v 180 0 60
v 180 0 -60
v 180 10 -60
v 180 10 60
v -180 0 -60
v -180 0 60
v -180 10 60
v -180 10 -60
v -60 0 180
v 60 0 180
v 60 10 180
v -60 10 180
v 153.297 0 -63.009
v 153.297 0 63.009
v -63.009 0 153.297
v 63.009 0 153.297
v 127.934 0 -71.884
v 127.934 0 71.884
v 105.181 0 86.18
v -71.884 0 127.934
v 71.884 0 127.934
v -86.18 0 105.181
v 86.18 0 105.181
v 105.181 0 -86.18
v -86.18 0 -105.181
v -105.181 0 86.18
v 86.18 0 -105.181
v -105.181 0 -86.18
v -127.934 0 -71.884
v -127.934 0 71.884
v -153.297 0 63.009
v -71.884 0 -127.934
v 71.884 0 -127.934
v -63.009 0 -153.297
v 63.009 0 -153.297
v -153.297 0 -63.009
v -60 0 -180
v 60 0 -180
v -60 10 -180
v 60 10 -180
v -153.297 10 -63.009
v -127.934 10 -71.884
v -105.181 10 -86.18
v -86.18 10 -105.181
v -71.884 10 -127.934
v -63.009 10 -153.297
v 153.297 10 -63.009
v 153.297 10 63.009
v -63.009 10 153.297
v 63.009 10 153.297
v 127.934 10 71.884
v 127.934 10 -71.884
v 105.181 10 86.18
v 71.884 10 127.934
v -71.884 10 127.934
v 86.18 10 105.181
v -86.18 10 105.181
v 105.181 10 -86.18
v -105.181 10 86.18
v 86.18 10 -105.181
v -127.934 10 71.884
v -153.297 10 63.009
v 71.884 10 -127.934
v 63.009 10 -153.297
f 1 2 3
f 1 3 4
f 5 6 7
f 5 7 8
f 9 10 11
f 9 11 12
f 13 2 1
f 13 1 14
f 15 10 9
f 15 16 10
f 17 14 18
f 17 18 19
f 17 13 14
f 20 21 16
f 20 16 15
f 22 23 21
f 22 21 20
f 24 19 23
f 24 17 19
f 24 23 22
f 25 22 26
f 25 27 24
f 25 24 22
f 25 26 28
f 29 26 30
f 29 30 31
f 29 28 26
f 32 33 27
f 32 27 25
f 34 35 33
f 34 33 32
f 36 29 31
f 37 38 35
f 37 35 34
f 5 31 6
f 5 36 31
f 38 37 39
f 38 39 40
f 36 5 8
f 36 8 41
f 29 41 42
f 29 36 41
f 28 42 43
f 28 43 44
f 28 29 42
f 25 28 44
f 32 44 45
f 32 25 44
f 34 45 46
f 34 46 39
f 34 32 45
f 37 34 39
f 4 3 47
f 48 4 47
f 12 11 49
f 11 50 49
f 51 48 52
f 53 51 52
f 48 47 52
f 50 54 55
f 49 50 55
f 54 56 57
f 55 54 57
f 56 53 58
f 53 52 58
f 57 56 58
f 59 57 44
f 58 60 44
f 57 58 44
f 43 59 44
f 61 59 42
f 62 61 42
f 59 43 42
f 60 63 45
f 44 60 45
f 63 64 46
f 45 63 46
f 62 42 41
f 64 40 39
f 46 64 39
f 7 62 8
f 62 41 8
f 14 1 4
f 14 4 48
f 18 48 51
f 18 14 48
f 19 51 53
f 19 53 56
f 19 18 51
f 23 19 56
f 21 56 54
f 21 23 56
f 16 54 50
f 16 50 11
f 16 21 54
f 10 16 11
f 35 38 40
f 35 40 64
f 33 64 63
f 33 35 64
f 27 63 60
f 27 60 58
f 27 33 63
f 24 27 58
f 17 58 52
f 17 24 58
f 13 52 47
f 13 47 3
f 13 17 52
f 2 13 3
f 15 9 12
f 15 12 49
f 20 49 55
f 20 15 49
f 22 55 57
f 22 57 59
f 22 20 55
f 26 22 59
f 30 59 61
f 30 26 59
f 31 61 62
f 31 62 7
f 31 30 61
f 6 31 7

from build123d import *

# Parameters (mm, degrees)
BOSS_EXTRUDE1_DEPTH = 10


with BuildPart() as part:
    # Sketch1 → Boss-Extrude1 (new body)
    with BuildSketch(Plane(origin=(0, 0, 0), x_dir=(1, 0, 0), z_dir=(0, 1, 0))):
        Polygon((60, -60), (60, -180), (-60, -180), (-60, -60), (-180, -60), (-180, 60), (-60, 60), (-60, 180), (60, 180), (60, 60), (180, 60), (180, -60), align=None)
        with BuildLine():
            Line((-60, 180), (-60, 60))
            Line((-60, 60), (-180, 60))
            ThreePointArc((-180, 60), (-95.147186258, 95.147186258), (-60, 180))
        make_face()
        with BuildLine():
            ThreePointArc((60, 180), (95.147186258, 95.147186258), (180, 60))
            Line((180, 60), (60, 60))
            Line((60, 60), (60, 180))
        make_face()
        with BuildLine():
            ThreePointArc((180, -60), (95.147186258, -95.147186258), (60, -180))
            Line((60, -180), (60, -60))
            Line((60, -60), (180, -60))
        make_face()
        with BuildLine():
            Line((-180, -60), (-60, -60))
            Line((-60, -60), (-60, -180))
            ThreePointArc((-60, -180), (-95.147186258, -95.147186258), (-180, -60))
        make_face()
    extrude(amount=BOSS_EXTRUDE1_DEPTH)


solid = part.part
